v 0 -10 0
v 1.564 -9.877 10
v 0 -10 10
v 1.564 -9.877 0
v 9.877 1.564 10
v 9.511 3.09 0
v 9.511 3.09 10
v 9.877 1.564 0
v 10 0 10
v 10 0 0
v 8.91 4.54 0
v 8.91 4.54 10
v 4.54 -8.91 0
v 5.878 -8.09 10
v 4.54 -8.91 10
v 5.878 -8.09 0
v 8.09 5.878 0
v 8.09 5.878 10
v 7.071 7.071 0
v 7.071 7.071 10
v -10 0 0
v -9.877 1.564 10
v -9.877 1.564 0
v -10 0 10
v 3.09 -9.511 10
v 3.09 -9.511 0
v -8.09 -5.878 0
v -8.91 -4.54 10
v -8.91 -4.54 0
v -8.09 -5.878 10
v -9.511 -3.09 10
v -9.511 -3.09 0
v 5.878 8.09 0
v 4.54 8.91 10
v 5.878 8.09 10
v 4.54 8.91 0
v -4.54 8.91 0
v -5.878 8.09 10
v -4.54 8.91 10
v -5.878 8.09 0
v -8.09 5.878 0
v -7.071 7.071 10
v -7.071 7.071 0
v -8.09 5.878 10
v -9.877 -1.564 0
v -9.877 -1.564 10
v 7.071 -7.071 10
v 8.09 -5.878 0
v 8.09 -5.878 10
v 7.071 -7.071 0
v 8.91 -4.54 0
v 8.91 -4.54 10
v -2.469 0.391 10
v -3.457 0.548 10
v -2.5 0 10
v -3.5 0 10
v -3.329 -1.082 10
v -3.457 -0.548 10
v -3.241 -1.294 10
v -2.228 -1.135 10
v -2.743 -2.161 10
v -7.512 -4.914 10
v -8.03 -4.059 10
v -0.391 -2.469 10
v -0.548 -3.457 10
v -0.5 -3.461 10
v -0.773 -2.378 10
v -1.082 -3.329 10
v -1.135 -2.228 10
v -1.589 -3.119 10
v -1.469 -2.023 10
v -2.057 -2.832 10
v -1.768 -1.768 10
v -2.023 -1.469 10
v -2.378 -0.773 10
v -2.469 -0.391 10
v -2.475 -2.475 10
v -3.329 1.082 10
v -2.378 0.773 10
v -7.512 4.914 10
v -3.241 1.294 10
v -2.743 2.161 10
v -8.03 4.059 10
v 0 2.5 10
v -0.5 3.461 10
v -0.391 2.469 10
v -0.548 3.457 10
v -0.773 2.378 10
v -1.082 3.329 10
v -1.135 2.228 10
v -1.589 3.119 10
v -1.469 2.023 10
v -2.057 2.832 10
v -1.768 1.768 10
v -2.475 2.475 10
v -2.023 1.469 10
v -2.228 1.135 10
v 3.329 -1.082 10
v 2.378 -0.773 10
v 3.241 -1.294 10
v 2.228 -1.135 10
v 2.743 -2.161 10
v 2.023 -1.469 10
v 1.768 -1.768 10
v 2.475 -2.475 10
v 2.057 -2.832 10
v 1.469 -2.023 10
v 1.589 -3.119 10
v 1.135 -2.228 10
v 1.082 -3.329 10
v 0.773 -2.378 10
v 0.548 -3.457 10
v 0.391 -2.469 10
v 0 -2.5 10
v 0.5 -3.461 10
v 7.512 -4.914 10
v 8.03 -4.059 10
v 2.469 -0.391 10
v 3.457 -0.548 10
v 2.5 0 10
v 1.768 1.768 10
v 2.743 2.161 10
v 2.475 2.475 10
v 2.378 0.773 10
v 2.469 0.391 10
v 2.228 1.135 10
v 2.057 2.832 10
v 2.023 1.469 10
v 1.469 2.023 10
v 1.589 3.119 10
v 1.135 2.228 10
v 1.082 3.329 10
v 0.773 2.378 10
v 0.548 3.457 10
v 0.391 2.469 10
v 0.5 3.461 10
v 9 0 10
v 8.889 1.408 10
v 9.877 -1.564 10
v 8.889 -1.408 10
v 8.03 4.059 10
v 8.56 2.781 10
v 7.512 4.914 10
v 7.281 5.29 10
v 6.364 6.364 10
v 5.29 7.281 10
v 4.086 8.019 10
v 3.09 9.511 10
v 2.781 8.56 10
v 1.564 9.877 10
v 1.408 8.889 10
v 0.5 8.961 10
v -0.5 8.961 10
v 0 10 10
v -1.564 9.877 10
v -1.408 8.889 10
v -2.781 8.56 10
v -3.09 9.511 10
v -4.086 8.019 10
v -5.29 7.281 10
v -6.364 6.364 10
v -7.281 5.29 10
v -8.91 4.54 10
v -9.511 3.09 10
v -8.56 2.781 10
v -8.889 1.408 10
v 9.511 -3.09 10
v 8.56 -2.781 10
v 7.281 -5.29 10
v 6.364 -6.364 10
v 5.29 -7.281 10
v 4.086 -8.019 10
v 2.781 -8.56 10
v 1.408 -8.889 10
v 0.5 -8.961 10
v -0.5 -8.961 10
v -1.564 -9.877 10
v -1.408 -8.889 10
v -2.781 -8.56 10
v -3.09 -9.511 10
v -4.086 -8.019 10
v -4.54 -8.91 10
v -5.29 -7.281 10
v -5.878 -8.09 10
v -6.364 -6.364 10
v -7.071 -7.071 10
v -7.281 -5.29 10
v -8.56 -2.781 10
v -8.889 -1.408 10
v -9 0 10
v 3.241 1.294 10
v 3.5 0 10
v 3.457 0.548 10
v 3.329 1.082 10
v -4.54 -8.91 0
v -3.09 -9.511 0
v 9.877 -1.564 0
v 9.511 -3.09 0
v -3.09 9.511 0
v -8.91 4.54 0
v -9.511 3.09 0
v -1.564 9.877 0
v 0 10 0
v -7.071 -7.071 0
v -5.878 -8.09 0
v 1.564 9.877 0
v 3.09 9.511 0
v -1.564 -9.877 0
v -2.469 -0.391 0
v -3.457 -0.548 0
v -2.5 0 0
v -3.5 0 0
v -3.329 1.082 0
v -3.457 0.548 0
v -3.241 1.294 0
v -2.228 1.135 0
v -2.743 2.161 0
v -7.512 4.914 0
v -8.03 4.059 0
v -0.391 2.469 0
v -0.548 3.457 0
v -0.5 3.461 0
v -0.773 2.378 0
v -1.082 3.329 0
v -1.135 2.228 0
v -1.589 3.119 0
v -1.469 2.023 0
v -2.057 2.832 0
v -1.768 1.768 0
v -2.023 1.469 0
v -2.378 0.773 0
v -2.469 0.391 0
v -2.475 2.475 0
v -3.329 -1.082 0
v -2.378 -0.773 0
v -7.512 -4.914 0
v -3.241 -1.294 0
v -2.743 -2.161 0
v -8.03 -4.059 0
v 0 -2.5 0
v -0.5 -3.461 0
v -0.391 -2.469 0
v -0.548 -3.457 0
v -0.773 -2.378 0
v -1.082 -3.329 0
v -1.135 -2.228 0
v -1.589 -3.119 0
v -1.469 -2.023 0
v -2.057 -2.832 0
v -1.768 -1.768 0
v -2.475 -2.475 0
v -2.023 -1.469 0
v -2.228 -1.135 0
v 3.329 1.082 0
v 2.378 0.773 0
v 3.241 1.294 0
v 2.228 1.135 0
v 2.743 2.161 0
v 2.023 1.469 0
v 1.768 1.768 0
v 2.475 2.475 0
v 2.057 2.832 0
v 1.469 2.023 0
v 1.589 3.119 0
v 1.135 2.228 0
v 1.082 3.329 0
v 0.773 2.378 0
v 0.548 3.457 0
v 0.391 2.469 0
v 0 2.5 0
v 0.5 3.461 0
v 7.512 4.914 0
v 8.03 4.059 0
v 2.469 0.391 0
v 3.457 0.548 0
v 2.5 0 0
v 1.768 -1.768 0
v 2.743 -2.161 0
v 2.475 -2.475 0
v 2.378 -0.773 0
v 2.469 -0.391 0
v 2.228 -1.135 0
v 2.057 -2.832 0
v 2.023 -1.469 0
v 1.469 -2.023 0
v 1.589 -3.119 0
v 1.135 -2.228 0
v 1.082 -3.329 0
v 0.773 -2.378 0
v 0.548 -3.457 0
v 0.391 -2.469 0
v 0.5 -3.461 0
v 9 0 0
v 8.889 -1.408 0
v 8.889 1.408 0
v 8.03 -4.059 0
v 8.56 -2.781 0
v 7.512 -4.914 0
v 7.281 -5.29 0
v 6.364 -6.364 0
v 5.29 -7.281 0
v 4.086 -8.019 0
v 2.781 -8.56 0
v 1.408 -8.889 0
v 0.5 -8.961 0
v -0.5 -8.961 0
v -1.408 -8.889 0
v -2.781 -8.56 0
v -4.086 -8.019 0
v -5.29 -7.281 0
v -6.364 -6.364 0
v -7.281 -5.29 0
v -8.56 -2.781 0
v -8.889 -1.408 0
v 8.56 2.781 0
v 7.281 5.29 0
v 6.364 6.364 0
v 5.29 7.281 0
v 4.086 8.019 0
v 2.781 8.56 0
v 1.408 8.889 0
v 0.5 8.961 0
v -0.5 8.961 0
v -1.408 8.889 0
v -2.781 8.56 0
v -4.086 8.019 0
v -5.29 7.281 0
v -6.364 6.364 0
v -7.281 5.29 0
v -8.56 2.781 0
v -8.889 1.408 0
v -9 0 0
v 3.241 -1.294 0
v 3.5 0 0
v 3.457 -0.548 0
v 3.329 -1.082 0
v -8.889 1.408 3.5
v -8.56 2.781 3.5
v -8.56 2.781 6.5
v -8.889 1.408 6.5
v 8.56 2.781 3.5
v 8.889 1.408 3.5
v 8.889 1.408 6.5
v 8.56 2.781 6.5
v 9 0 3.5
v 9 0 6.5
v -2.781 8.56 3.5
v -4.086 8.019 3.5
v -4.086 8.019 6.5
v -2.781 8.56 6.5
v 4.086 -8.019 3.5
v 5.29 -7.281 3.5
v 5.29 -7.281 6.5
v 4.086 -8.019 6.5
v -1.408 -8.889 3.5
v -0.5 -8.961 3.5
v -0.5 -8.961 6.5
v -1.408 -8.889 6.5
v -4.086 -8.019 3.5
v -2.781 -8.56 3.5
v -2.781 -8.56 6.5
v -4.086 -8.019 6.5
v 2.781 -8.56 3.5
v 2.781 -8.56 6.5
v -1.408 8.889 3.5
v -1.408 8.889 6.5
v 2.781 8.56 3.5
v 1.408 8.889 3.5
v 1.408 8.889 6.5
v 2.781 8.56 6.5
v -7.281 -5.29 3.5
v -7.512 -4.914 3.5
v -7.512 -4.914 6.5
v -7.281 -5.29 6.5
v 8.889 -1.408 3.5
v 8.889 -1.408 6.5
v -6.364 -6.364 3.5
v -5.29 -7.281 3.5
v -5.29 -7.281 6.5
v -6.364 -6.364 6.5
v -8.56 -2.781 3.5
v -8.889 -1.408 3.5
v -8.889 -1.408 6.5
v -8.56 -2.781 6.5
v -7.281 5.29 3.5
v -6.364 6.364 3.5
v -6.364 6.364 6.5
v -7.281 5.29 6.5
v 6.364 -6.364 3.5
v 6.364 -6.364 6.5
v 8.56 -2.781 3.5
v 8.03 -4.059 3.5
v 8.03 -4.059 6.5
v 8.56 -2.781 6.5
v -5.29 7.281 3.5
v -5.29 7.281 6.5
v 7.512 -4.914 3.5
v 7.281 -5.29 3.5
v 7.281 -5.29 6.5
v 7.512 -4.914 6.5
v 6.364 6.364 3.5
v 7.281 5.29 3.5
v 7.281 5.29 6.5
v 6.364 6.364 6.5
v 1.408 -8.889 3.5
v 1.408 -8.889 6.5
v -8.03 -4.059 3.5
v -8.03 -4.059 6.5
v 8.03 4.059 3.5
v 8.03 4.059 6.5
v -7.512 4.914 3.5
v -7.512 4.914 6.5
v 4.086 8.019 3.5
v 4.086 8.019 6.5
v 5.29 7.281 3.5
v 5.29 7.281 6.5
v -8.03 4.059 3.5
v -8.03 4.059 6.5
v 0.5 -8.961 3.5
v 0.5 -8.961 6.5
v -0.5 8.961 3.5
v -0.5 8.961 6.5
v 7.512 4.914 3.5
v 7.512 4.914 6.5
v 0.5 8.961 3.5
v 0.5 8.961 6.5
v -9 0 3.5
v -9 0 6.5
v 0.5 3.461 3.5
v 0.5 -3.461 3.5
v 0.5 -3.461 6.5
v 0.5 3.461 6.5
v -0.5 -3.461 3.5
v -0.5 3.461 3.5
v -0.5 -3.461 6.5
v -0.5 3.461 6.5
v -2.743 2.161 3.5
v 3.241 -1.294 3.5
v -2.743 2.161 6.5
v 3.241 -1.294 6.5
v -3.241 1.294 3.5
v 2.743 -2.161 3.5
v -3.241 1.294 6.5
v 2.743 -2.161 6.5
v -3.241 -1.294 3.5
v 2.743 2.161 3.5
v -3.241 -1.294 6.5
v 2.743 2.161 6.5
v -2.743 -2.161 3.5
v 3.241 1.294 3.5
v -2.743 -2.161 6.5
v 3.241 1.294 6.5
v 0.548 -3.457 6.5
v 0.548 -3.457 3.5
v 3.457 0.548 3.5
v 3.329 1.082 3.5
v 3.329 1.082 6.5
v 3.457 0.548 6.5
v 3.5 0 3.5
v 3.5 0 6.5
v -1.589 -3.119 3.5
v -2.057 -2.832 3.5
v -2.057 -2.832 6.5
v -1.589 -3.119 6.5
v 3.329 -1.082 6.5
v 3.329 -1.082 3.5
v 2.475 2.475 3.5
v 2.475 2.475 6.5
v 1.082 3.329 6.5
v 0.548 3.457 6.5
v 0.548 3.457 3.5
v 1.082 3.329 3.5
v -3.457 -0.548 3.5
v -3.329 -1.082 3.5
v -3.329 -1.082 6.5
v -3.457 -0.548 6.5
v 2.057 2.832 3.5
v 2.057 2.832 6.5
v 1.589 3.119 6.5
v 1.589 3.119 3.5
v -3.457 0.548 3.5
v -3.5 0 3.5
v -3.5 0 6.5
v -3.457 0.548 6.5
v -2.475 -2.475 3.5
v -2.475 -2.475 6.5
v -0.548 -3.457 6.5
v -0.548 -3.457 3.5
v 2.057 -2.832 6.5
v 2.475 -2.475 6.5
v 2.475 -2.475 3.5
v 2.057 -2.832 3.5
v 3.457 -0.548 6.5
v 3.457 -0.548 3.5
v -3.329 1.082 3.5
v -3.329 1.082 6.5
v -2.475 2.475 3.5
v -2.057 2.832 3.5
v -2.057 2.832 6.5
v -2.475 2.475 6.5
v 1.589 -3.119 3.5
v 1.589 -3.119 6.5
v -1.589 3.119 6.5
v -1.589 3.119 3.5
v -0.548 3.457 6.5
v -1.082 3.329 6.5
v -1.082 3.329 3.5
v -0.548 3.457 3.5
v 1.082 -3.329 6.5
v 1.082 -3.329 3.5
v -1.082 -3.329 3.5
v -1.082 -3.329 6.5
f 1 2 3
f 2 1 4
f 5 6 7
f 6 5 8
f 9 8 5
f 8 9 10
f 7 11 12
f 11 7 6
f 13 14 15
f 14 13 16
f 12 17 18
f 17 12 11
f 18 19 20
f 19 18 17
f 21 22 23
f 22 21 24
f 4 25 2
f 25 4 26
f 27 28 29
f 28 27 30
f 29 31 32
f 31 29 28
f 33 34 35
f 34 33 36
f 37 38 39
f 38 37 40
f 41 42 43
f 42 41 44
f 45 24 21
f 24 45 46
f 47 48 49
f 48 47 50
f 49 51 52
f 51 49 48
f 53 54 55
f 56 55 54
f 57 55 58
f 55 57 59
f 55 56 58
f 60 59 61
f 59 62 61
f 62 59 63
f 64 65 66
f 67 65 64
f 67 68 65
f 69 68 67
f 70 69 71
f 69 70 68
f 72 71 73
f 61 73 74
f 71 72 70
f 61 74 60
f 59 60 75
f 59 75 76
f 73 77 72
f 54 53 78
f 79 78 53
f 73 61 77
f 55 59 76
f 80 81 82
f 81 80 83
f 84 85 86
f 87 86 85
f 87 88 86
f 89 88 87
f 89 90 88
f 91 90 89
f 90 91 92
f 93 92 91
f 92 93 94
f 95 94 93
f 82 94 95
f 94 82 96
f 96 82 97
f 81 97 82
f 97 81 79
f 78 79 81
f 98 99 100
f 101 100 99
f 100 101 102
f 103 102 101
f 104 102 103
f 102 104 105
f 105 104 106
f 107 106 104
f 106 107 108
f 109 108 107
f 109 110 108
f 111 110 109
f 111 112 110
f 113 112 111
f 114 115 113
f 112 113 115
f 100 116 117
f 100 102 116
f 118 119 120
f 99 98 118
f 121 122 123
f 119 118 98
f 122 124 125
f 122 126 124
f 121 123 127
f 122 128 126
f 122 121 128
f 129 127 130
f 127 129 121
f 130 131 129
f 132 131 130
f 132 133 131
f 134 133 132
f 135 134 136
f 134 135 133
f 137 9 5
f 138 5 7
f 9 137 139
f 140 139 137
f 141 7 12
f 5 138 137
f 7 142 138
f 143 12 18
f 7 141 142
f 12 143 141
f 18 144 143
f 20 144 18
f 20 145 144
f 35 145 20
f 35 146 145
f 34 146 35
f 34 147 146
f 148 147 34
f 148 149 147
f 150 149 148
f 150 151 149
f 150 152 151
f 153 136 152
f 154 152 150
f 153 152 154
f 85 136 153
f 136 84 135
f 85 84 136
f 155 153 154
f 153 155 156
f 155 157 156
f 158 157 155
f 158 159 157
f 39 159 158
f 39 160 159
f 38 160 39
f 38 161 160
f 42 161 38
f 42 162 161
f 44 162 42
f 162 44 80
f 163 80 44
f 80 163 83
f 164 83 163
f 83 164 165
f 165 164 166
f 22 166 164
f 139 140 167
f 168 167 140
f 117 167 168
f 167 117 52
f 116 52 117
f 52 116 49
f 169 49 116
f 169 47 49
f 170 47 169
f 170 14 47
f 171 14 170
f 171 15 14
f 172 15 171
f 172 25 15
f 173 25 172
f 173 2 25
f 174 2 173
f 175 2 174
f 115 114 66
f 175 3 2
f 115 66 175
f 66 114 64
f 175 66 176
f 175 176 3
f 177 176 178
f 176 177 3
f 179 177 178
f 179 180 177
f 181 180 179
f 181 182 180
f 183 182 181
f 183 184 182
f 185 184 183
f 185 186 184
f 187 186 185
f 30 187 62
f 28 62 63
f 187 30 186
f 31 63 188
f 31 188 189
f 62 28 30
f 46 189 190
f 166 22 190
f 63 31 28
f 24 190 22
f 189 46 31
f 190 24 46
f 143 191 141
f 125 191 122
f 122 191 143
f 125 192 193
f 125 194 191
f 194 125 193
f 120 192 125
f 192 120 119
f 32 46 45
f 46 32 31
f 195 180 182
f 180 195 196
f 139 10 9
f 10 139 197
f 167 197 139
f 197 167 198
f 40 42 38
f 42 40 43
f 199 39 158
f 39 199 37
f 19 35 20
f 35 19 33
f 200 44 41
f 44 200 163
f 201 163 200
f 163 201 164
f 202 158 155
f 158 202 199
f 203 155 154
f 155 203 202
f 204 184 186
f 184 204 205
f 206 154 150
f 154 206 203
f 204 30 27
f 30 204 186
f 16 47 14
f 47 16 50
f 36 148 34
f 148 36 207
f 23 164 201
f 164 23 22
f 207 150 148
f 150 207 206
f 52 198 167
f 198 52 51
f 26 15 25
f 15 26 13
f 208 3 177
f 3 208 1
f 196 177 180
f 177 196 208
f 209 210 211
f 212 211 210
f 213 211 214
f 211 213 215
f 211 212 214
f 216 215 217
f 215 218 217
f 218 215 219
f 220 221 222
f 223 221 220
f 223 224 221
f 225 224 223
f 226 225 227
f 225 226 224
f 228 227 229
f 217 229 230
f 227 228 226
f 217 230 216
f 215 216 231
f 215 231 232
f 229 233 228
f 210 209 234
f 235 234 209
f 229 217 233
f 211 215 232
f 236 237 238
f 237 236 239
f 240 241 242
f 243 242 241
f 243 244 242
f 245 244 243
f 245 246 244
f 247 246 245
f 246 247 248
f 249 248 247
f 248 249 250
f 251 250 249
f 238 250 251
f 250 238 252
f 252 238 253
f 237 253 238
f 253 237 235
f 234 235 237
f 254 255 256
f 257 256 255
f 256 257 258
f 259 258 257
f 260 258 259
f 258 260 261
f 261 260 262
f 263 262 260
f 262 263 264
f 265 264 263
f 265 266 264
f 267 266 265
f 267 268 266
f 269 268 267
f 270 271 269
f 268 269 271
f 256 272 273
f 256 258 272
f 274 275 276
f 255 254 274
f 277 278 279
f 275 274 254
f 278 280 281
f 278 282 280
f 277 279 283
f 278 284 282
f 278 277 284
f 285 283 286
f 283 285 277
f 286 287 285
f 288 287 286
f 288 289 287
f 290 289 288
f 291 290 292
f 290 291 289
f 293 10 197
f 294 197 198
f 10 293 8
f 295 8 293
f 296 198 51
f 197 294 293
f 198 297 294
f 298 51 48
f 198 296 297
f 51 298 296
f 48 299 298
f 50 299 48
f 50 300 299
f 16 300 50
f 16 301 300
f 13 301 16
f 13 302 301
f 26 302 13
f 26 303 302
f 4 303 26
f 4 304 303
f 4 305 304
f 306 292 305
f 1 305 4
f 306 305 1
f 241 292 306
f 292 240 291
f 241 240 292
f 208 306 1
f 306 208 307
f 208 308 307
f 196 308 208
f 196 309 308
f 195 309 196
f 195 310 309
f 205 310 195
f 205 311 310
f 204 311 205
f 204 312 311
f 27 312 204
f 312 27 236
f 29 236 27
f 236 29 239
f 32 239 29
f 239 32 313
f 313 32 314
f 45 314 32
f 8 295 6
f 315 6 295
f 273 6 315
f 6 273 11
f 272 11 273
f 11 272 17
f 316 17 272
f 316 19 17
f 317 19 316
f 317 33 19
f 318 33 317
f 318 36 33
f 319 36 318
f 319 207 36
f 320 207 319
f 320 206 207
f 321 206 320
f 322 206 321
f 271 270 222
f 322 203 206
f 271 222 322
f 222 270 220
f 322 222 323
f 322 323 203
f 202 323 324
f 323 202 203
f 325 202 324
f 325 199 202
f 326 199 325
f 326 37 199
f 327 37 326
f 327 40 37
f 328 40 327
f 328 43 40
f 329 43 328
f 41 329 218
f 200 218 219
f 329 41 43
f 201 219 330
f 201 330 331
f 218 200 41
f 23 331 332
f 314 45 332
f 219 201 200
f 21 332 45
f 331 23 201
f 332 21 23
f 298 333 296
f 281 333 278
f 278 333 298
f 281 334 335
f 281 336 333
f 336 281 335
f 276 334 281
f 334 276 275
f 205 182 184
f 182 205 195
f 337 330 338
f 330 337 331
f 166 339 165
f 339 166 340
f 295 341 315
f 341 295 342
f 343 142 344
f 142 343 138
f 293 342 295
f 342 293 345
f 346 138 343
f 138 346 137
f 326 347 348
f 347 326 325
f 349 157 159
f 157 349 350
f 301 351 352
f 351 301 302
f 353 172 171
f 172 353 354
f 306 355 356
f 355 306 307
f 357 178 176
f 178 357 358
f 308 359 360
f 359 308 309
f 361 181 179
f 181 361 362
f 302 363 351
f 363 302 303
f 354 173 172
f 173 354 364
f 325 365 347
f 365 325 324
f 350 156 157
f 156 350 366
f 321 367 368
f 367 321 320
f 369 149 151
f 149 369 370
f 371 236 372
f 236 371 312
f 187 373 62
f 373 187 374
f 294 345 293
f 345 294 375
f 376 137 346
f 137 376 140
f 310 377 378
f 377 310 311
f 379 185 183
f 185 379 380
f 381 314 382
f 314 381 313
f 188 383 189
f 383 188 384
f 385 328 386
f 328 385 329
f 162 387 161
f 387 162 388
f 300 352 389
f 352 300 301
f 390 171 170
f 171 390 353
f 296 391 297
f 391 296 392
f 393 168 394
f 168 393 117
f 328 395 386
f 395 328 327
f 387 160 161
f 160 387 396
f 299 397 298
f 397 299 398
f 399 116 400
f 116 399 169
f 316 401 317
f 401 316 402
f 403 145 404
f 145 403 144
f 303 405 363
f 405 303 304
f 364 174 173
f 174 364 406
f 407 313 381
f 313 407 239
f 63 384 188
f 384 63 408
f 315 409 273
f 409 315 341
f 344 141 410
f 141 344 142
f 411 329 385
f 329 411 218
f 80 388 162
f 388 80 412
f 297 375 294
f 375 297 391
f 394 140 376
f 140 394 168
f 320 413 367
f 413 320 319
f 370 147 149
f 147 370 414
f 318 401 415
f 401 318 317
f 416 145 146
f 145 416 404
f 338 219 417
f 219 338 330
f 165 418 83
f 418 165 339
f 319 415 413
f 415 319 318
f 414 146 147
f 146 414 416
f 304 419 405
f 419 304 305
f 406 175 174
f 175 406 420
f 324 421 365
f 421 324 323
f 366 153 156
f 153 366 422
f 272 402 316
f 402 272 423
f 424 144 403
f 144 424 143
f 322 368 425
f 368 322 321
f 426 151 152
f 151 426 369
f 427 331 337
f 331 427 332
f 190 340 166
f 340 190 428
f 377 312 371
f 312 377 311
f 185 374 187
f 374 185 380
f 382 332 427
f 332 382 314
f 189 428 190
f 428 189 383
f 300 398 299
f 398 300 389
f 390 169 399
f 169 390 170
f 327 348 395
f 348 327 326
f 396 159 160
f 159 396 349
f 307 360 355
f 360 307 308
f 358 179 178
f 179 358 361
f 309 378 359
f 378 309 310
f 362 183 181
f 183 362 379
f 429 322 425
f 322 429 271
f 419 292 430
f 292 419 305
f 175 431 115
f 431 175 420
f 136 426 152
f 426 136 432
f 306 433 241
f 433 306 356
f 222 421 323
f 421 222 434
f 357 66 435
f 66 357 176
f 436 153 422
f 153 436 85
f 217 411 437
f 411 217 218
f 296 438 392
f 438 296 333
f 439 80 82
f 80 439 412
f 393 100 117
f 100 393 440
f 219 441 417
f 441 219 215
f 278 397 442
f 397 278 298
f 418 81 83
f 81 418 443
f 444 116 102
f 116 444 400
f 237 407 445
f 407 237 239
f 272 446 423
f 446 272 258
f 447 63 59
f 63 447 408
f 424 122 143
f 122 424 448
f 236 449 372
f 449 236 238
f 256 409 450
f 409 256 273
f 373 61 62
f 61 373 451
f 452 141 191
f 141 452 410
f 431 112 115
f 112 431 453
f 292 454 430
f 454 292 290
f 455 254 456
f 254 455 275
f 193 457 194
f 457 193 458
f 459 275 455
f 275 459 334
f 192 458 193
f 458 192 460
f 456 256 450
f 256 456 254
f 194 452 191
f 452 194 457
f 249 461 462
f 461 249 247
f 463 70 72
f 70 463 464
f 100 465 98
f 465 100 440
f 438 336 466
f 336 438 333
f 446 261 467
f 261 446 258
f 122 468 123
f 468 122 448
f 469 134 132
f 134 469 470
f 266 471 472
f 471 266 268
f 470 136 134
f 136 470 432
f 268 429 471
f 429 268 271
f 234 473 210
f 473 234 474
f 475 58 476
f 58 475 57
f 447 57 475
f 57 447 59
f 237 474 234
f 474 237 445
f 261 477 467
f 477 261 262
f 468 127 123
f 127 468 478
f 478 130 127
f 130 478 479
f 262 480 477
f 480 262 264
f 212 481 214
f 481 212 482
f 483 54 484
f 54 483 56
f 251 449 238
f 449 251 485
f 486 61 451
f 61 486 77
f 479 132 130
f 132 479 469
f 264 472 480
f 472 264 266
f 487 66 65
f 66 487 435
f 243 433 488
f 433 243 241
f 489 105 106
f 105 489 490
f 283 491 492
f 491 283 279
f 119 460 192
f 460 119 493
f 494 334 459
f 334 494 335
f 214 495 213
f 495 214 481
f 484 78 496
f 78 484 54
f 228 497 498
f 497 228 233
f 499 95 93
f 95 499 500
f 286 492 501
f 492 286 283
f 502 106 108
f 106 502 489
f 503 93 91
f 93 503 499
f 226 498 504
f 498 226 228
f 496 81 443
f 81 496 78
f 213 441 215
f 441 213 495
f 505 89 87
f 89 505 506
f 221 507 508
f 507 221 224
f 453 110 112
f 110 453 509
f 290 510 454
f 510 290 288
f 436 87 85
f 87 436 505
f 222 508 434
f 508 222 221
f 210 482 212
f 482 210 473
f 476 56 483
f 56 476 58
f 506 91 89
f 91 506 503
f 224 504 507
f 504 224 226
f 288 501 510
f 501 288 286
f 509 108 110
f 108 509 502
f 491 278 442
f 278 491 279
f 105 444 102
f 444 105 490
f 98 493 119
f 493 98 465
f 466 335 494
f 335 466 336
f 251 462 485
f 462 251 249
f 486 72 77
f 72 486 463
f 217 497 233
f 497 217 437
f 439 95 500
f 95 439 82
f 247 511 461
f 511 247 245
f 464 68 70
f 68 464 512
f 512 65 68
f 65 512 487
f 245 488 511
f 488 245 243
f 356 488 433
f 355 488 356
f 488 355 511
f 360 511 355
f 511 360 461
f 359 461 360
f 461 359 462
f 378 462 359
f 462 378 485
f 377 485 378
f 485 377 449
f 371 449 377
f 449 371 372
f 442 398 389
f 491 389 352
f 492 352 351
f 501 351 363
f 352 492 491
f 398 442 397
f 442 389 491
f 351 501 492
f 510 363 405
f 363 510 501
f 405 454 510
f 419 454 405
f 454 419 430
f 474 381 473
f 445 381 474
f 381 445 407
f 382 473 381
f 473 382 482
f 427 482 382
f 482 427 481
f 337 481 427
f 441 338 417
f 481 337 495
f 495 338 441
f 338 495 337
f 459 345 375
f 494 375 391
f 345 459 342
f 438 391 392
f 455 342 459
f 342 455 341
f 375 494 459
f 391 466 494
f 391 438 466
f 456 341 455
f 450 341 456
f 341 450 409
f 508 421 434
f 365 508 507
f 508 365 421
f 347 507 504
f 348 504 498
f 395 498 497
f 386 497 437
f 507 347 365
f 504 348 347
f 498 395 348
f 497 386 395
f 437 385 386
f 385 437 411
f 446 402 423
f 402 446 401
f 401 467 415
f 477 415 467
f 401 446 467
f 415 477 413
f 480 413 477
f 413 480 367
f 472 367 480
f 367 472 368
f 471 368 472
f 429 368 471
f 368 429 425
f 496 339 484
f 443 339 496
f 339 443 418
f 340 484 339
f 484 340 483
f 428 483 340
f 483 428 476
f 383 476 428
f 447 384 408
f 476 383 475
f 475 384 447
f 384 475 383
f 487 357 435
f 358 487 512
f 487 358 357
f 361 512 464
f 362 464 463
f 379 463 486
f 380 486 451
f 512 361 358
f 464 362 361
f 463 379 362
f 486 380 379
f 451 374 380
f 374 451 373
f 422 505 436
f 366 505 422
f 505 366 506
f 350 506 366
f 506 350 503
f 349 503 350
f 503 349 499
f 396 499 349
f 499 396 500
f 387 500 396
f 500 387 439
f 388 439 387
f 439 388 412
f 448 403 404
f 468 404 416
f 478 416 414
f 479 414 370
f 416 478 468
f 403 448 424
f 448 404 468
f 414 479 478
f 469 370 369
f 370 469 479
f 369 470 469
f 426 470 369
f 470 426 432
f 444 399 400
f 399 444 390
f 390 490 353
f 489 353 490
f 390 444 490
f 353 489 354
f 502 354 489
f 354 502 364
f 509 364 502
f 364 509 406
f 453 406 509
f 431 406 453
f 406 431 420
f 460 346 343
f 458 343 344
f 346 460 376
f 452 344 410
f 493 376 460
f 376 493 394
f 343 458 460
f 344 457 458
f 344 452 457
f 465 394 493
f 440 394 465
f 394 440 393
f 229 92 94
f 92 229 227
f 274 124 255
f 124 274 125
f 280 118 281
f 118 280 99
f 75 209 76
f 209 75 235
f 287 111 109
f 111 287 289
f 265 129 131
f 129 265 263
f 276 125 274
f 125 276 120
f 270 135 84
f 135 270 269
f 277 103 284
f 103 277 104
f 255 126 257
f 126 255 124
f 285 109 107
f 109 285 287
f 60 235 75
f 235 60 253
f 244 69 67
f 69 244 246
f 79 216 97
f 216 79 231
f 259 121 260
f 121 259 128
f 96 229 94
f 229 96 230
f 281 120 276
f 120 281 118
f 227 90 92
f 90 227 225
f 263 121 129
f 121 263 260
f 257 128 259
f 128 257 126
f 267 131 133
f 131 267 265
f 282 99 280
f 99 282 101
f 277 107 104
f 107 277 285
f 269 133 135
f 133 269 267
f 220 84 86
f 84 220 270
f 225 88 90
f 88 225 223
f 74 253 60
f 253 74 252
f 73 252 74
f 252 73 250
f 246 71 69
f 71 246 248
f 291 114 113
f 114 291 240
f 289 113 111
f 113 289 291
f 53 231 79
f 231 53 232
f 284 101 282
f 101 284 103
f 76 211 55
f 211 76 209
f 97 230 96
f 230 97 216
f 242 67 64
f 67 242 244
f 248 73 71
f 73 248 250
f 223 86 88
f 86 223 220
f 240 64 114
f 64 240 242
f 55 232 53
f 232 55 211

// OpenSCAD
nfacets=40;

wheel_width=10;
wheel_diam=20;
wheel_hole_diam=5;
wheel_symplate_width=3;
wheel_rim_thickness=1;
wheel_radplate_width=1;

module wheel() {
    difference() {

        union() {
            // Rim
            difference() {
                cylinder(d=wheel_diam,h=wheel_width,
                         center=true,$fn=nfacets);
                cylinder(d=wheel_diam-2*wheel_rim_thickness,
                         h=wheel_width+2,
                         center=true,$fn=nfacets);
                }

            // Center part
            cylinder(d=wheel_hole_diam+2,
                    h=wheel_width,center=true,
                    $fn=nfacets);

           // Symmetry plate
            cylinder(d=wheel_diam,h=wheel_symplate_width,
                    center=true,$fn=nfacets);

                for(i=[0:2]) {
                    rotate([0,0,i*60])
                        cube([wheel_radplate_width,
                                wheel_diam-.5,
                                wheel_width],
                            center=true);
                }
            }
        cylinder(d=wheel_hole_diam,h=wheel_width+2,center=true,$fn=nfacets);

    }
}

translate([0,0,wheel_width*0.5]) wheel();
